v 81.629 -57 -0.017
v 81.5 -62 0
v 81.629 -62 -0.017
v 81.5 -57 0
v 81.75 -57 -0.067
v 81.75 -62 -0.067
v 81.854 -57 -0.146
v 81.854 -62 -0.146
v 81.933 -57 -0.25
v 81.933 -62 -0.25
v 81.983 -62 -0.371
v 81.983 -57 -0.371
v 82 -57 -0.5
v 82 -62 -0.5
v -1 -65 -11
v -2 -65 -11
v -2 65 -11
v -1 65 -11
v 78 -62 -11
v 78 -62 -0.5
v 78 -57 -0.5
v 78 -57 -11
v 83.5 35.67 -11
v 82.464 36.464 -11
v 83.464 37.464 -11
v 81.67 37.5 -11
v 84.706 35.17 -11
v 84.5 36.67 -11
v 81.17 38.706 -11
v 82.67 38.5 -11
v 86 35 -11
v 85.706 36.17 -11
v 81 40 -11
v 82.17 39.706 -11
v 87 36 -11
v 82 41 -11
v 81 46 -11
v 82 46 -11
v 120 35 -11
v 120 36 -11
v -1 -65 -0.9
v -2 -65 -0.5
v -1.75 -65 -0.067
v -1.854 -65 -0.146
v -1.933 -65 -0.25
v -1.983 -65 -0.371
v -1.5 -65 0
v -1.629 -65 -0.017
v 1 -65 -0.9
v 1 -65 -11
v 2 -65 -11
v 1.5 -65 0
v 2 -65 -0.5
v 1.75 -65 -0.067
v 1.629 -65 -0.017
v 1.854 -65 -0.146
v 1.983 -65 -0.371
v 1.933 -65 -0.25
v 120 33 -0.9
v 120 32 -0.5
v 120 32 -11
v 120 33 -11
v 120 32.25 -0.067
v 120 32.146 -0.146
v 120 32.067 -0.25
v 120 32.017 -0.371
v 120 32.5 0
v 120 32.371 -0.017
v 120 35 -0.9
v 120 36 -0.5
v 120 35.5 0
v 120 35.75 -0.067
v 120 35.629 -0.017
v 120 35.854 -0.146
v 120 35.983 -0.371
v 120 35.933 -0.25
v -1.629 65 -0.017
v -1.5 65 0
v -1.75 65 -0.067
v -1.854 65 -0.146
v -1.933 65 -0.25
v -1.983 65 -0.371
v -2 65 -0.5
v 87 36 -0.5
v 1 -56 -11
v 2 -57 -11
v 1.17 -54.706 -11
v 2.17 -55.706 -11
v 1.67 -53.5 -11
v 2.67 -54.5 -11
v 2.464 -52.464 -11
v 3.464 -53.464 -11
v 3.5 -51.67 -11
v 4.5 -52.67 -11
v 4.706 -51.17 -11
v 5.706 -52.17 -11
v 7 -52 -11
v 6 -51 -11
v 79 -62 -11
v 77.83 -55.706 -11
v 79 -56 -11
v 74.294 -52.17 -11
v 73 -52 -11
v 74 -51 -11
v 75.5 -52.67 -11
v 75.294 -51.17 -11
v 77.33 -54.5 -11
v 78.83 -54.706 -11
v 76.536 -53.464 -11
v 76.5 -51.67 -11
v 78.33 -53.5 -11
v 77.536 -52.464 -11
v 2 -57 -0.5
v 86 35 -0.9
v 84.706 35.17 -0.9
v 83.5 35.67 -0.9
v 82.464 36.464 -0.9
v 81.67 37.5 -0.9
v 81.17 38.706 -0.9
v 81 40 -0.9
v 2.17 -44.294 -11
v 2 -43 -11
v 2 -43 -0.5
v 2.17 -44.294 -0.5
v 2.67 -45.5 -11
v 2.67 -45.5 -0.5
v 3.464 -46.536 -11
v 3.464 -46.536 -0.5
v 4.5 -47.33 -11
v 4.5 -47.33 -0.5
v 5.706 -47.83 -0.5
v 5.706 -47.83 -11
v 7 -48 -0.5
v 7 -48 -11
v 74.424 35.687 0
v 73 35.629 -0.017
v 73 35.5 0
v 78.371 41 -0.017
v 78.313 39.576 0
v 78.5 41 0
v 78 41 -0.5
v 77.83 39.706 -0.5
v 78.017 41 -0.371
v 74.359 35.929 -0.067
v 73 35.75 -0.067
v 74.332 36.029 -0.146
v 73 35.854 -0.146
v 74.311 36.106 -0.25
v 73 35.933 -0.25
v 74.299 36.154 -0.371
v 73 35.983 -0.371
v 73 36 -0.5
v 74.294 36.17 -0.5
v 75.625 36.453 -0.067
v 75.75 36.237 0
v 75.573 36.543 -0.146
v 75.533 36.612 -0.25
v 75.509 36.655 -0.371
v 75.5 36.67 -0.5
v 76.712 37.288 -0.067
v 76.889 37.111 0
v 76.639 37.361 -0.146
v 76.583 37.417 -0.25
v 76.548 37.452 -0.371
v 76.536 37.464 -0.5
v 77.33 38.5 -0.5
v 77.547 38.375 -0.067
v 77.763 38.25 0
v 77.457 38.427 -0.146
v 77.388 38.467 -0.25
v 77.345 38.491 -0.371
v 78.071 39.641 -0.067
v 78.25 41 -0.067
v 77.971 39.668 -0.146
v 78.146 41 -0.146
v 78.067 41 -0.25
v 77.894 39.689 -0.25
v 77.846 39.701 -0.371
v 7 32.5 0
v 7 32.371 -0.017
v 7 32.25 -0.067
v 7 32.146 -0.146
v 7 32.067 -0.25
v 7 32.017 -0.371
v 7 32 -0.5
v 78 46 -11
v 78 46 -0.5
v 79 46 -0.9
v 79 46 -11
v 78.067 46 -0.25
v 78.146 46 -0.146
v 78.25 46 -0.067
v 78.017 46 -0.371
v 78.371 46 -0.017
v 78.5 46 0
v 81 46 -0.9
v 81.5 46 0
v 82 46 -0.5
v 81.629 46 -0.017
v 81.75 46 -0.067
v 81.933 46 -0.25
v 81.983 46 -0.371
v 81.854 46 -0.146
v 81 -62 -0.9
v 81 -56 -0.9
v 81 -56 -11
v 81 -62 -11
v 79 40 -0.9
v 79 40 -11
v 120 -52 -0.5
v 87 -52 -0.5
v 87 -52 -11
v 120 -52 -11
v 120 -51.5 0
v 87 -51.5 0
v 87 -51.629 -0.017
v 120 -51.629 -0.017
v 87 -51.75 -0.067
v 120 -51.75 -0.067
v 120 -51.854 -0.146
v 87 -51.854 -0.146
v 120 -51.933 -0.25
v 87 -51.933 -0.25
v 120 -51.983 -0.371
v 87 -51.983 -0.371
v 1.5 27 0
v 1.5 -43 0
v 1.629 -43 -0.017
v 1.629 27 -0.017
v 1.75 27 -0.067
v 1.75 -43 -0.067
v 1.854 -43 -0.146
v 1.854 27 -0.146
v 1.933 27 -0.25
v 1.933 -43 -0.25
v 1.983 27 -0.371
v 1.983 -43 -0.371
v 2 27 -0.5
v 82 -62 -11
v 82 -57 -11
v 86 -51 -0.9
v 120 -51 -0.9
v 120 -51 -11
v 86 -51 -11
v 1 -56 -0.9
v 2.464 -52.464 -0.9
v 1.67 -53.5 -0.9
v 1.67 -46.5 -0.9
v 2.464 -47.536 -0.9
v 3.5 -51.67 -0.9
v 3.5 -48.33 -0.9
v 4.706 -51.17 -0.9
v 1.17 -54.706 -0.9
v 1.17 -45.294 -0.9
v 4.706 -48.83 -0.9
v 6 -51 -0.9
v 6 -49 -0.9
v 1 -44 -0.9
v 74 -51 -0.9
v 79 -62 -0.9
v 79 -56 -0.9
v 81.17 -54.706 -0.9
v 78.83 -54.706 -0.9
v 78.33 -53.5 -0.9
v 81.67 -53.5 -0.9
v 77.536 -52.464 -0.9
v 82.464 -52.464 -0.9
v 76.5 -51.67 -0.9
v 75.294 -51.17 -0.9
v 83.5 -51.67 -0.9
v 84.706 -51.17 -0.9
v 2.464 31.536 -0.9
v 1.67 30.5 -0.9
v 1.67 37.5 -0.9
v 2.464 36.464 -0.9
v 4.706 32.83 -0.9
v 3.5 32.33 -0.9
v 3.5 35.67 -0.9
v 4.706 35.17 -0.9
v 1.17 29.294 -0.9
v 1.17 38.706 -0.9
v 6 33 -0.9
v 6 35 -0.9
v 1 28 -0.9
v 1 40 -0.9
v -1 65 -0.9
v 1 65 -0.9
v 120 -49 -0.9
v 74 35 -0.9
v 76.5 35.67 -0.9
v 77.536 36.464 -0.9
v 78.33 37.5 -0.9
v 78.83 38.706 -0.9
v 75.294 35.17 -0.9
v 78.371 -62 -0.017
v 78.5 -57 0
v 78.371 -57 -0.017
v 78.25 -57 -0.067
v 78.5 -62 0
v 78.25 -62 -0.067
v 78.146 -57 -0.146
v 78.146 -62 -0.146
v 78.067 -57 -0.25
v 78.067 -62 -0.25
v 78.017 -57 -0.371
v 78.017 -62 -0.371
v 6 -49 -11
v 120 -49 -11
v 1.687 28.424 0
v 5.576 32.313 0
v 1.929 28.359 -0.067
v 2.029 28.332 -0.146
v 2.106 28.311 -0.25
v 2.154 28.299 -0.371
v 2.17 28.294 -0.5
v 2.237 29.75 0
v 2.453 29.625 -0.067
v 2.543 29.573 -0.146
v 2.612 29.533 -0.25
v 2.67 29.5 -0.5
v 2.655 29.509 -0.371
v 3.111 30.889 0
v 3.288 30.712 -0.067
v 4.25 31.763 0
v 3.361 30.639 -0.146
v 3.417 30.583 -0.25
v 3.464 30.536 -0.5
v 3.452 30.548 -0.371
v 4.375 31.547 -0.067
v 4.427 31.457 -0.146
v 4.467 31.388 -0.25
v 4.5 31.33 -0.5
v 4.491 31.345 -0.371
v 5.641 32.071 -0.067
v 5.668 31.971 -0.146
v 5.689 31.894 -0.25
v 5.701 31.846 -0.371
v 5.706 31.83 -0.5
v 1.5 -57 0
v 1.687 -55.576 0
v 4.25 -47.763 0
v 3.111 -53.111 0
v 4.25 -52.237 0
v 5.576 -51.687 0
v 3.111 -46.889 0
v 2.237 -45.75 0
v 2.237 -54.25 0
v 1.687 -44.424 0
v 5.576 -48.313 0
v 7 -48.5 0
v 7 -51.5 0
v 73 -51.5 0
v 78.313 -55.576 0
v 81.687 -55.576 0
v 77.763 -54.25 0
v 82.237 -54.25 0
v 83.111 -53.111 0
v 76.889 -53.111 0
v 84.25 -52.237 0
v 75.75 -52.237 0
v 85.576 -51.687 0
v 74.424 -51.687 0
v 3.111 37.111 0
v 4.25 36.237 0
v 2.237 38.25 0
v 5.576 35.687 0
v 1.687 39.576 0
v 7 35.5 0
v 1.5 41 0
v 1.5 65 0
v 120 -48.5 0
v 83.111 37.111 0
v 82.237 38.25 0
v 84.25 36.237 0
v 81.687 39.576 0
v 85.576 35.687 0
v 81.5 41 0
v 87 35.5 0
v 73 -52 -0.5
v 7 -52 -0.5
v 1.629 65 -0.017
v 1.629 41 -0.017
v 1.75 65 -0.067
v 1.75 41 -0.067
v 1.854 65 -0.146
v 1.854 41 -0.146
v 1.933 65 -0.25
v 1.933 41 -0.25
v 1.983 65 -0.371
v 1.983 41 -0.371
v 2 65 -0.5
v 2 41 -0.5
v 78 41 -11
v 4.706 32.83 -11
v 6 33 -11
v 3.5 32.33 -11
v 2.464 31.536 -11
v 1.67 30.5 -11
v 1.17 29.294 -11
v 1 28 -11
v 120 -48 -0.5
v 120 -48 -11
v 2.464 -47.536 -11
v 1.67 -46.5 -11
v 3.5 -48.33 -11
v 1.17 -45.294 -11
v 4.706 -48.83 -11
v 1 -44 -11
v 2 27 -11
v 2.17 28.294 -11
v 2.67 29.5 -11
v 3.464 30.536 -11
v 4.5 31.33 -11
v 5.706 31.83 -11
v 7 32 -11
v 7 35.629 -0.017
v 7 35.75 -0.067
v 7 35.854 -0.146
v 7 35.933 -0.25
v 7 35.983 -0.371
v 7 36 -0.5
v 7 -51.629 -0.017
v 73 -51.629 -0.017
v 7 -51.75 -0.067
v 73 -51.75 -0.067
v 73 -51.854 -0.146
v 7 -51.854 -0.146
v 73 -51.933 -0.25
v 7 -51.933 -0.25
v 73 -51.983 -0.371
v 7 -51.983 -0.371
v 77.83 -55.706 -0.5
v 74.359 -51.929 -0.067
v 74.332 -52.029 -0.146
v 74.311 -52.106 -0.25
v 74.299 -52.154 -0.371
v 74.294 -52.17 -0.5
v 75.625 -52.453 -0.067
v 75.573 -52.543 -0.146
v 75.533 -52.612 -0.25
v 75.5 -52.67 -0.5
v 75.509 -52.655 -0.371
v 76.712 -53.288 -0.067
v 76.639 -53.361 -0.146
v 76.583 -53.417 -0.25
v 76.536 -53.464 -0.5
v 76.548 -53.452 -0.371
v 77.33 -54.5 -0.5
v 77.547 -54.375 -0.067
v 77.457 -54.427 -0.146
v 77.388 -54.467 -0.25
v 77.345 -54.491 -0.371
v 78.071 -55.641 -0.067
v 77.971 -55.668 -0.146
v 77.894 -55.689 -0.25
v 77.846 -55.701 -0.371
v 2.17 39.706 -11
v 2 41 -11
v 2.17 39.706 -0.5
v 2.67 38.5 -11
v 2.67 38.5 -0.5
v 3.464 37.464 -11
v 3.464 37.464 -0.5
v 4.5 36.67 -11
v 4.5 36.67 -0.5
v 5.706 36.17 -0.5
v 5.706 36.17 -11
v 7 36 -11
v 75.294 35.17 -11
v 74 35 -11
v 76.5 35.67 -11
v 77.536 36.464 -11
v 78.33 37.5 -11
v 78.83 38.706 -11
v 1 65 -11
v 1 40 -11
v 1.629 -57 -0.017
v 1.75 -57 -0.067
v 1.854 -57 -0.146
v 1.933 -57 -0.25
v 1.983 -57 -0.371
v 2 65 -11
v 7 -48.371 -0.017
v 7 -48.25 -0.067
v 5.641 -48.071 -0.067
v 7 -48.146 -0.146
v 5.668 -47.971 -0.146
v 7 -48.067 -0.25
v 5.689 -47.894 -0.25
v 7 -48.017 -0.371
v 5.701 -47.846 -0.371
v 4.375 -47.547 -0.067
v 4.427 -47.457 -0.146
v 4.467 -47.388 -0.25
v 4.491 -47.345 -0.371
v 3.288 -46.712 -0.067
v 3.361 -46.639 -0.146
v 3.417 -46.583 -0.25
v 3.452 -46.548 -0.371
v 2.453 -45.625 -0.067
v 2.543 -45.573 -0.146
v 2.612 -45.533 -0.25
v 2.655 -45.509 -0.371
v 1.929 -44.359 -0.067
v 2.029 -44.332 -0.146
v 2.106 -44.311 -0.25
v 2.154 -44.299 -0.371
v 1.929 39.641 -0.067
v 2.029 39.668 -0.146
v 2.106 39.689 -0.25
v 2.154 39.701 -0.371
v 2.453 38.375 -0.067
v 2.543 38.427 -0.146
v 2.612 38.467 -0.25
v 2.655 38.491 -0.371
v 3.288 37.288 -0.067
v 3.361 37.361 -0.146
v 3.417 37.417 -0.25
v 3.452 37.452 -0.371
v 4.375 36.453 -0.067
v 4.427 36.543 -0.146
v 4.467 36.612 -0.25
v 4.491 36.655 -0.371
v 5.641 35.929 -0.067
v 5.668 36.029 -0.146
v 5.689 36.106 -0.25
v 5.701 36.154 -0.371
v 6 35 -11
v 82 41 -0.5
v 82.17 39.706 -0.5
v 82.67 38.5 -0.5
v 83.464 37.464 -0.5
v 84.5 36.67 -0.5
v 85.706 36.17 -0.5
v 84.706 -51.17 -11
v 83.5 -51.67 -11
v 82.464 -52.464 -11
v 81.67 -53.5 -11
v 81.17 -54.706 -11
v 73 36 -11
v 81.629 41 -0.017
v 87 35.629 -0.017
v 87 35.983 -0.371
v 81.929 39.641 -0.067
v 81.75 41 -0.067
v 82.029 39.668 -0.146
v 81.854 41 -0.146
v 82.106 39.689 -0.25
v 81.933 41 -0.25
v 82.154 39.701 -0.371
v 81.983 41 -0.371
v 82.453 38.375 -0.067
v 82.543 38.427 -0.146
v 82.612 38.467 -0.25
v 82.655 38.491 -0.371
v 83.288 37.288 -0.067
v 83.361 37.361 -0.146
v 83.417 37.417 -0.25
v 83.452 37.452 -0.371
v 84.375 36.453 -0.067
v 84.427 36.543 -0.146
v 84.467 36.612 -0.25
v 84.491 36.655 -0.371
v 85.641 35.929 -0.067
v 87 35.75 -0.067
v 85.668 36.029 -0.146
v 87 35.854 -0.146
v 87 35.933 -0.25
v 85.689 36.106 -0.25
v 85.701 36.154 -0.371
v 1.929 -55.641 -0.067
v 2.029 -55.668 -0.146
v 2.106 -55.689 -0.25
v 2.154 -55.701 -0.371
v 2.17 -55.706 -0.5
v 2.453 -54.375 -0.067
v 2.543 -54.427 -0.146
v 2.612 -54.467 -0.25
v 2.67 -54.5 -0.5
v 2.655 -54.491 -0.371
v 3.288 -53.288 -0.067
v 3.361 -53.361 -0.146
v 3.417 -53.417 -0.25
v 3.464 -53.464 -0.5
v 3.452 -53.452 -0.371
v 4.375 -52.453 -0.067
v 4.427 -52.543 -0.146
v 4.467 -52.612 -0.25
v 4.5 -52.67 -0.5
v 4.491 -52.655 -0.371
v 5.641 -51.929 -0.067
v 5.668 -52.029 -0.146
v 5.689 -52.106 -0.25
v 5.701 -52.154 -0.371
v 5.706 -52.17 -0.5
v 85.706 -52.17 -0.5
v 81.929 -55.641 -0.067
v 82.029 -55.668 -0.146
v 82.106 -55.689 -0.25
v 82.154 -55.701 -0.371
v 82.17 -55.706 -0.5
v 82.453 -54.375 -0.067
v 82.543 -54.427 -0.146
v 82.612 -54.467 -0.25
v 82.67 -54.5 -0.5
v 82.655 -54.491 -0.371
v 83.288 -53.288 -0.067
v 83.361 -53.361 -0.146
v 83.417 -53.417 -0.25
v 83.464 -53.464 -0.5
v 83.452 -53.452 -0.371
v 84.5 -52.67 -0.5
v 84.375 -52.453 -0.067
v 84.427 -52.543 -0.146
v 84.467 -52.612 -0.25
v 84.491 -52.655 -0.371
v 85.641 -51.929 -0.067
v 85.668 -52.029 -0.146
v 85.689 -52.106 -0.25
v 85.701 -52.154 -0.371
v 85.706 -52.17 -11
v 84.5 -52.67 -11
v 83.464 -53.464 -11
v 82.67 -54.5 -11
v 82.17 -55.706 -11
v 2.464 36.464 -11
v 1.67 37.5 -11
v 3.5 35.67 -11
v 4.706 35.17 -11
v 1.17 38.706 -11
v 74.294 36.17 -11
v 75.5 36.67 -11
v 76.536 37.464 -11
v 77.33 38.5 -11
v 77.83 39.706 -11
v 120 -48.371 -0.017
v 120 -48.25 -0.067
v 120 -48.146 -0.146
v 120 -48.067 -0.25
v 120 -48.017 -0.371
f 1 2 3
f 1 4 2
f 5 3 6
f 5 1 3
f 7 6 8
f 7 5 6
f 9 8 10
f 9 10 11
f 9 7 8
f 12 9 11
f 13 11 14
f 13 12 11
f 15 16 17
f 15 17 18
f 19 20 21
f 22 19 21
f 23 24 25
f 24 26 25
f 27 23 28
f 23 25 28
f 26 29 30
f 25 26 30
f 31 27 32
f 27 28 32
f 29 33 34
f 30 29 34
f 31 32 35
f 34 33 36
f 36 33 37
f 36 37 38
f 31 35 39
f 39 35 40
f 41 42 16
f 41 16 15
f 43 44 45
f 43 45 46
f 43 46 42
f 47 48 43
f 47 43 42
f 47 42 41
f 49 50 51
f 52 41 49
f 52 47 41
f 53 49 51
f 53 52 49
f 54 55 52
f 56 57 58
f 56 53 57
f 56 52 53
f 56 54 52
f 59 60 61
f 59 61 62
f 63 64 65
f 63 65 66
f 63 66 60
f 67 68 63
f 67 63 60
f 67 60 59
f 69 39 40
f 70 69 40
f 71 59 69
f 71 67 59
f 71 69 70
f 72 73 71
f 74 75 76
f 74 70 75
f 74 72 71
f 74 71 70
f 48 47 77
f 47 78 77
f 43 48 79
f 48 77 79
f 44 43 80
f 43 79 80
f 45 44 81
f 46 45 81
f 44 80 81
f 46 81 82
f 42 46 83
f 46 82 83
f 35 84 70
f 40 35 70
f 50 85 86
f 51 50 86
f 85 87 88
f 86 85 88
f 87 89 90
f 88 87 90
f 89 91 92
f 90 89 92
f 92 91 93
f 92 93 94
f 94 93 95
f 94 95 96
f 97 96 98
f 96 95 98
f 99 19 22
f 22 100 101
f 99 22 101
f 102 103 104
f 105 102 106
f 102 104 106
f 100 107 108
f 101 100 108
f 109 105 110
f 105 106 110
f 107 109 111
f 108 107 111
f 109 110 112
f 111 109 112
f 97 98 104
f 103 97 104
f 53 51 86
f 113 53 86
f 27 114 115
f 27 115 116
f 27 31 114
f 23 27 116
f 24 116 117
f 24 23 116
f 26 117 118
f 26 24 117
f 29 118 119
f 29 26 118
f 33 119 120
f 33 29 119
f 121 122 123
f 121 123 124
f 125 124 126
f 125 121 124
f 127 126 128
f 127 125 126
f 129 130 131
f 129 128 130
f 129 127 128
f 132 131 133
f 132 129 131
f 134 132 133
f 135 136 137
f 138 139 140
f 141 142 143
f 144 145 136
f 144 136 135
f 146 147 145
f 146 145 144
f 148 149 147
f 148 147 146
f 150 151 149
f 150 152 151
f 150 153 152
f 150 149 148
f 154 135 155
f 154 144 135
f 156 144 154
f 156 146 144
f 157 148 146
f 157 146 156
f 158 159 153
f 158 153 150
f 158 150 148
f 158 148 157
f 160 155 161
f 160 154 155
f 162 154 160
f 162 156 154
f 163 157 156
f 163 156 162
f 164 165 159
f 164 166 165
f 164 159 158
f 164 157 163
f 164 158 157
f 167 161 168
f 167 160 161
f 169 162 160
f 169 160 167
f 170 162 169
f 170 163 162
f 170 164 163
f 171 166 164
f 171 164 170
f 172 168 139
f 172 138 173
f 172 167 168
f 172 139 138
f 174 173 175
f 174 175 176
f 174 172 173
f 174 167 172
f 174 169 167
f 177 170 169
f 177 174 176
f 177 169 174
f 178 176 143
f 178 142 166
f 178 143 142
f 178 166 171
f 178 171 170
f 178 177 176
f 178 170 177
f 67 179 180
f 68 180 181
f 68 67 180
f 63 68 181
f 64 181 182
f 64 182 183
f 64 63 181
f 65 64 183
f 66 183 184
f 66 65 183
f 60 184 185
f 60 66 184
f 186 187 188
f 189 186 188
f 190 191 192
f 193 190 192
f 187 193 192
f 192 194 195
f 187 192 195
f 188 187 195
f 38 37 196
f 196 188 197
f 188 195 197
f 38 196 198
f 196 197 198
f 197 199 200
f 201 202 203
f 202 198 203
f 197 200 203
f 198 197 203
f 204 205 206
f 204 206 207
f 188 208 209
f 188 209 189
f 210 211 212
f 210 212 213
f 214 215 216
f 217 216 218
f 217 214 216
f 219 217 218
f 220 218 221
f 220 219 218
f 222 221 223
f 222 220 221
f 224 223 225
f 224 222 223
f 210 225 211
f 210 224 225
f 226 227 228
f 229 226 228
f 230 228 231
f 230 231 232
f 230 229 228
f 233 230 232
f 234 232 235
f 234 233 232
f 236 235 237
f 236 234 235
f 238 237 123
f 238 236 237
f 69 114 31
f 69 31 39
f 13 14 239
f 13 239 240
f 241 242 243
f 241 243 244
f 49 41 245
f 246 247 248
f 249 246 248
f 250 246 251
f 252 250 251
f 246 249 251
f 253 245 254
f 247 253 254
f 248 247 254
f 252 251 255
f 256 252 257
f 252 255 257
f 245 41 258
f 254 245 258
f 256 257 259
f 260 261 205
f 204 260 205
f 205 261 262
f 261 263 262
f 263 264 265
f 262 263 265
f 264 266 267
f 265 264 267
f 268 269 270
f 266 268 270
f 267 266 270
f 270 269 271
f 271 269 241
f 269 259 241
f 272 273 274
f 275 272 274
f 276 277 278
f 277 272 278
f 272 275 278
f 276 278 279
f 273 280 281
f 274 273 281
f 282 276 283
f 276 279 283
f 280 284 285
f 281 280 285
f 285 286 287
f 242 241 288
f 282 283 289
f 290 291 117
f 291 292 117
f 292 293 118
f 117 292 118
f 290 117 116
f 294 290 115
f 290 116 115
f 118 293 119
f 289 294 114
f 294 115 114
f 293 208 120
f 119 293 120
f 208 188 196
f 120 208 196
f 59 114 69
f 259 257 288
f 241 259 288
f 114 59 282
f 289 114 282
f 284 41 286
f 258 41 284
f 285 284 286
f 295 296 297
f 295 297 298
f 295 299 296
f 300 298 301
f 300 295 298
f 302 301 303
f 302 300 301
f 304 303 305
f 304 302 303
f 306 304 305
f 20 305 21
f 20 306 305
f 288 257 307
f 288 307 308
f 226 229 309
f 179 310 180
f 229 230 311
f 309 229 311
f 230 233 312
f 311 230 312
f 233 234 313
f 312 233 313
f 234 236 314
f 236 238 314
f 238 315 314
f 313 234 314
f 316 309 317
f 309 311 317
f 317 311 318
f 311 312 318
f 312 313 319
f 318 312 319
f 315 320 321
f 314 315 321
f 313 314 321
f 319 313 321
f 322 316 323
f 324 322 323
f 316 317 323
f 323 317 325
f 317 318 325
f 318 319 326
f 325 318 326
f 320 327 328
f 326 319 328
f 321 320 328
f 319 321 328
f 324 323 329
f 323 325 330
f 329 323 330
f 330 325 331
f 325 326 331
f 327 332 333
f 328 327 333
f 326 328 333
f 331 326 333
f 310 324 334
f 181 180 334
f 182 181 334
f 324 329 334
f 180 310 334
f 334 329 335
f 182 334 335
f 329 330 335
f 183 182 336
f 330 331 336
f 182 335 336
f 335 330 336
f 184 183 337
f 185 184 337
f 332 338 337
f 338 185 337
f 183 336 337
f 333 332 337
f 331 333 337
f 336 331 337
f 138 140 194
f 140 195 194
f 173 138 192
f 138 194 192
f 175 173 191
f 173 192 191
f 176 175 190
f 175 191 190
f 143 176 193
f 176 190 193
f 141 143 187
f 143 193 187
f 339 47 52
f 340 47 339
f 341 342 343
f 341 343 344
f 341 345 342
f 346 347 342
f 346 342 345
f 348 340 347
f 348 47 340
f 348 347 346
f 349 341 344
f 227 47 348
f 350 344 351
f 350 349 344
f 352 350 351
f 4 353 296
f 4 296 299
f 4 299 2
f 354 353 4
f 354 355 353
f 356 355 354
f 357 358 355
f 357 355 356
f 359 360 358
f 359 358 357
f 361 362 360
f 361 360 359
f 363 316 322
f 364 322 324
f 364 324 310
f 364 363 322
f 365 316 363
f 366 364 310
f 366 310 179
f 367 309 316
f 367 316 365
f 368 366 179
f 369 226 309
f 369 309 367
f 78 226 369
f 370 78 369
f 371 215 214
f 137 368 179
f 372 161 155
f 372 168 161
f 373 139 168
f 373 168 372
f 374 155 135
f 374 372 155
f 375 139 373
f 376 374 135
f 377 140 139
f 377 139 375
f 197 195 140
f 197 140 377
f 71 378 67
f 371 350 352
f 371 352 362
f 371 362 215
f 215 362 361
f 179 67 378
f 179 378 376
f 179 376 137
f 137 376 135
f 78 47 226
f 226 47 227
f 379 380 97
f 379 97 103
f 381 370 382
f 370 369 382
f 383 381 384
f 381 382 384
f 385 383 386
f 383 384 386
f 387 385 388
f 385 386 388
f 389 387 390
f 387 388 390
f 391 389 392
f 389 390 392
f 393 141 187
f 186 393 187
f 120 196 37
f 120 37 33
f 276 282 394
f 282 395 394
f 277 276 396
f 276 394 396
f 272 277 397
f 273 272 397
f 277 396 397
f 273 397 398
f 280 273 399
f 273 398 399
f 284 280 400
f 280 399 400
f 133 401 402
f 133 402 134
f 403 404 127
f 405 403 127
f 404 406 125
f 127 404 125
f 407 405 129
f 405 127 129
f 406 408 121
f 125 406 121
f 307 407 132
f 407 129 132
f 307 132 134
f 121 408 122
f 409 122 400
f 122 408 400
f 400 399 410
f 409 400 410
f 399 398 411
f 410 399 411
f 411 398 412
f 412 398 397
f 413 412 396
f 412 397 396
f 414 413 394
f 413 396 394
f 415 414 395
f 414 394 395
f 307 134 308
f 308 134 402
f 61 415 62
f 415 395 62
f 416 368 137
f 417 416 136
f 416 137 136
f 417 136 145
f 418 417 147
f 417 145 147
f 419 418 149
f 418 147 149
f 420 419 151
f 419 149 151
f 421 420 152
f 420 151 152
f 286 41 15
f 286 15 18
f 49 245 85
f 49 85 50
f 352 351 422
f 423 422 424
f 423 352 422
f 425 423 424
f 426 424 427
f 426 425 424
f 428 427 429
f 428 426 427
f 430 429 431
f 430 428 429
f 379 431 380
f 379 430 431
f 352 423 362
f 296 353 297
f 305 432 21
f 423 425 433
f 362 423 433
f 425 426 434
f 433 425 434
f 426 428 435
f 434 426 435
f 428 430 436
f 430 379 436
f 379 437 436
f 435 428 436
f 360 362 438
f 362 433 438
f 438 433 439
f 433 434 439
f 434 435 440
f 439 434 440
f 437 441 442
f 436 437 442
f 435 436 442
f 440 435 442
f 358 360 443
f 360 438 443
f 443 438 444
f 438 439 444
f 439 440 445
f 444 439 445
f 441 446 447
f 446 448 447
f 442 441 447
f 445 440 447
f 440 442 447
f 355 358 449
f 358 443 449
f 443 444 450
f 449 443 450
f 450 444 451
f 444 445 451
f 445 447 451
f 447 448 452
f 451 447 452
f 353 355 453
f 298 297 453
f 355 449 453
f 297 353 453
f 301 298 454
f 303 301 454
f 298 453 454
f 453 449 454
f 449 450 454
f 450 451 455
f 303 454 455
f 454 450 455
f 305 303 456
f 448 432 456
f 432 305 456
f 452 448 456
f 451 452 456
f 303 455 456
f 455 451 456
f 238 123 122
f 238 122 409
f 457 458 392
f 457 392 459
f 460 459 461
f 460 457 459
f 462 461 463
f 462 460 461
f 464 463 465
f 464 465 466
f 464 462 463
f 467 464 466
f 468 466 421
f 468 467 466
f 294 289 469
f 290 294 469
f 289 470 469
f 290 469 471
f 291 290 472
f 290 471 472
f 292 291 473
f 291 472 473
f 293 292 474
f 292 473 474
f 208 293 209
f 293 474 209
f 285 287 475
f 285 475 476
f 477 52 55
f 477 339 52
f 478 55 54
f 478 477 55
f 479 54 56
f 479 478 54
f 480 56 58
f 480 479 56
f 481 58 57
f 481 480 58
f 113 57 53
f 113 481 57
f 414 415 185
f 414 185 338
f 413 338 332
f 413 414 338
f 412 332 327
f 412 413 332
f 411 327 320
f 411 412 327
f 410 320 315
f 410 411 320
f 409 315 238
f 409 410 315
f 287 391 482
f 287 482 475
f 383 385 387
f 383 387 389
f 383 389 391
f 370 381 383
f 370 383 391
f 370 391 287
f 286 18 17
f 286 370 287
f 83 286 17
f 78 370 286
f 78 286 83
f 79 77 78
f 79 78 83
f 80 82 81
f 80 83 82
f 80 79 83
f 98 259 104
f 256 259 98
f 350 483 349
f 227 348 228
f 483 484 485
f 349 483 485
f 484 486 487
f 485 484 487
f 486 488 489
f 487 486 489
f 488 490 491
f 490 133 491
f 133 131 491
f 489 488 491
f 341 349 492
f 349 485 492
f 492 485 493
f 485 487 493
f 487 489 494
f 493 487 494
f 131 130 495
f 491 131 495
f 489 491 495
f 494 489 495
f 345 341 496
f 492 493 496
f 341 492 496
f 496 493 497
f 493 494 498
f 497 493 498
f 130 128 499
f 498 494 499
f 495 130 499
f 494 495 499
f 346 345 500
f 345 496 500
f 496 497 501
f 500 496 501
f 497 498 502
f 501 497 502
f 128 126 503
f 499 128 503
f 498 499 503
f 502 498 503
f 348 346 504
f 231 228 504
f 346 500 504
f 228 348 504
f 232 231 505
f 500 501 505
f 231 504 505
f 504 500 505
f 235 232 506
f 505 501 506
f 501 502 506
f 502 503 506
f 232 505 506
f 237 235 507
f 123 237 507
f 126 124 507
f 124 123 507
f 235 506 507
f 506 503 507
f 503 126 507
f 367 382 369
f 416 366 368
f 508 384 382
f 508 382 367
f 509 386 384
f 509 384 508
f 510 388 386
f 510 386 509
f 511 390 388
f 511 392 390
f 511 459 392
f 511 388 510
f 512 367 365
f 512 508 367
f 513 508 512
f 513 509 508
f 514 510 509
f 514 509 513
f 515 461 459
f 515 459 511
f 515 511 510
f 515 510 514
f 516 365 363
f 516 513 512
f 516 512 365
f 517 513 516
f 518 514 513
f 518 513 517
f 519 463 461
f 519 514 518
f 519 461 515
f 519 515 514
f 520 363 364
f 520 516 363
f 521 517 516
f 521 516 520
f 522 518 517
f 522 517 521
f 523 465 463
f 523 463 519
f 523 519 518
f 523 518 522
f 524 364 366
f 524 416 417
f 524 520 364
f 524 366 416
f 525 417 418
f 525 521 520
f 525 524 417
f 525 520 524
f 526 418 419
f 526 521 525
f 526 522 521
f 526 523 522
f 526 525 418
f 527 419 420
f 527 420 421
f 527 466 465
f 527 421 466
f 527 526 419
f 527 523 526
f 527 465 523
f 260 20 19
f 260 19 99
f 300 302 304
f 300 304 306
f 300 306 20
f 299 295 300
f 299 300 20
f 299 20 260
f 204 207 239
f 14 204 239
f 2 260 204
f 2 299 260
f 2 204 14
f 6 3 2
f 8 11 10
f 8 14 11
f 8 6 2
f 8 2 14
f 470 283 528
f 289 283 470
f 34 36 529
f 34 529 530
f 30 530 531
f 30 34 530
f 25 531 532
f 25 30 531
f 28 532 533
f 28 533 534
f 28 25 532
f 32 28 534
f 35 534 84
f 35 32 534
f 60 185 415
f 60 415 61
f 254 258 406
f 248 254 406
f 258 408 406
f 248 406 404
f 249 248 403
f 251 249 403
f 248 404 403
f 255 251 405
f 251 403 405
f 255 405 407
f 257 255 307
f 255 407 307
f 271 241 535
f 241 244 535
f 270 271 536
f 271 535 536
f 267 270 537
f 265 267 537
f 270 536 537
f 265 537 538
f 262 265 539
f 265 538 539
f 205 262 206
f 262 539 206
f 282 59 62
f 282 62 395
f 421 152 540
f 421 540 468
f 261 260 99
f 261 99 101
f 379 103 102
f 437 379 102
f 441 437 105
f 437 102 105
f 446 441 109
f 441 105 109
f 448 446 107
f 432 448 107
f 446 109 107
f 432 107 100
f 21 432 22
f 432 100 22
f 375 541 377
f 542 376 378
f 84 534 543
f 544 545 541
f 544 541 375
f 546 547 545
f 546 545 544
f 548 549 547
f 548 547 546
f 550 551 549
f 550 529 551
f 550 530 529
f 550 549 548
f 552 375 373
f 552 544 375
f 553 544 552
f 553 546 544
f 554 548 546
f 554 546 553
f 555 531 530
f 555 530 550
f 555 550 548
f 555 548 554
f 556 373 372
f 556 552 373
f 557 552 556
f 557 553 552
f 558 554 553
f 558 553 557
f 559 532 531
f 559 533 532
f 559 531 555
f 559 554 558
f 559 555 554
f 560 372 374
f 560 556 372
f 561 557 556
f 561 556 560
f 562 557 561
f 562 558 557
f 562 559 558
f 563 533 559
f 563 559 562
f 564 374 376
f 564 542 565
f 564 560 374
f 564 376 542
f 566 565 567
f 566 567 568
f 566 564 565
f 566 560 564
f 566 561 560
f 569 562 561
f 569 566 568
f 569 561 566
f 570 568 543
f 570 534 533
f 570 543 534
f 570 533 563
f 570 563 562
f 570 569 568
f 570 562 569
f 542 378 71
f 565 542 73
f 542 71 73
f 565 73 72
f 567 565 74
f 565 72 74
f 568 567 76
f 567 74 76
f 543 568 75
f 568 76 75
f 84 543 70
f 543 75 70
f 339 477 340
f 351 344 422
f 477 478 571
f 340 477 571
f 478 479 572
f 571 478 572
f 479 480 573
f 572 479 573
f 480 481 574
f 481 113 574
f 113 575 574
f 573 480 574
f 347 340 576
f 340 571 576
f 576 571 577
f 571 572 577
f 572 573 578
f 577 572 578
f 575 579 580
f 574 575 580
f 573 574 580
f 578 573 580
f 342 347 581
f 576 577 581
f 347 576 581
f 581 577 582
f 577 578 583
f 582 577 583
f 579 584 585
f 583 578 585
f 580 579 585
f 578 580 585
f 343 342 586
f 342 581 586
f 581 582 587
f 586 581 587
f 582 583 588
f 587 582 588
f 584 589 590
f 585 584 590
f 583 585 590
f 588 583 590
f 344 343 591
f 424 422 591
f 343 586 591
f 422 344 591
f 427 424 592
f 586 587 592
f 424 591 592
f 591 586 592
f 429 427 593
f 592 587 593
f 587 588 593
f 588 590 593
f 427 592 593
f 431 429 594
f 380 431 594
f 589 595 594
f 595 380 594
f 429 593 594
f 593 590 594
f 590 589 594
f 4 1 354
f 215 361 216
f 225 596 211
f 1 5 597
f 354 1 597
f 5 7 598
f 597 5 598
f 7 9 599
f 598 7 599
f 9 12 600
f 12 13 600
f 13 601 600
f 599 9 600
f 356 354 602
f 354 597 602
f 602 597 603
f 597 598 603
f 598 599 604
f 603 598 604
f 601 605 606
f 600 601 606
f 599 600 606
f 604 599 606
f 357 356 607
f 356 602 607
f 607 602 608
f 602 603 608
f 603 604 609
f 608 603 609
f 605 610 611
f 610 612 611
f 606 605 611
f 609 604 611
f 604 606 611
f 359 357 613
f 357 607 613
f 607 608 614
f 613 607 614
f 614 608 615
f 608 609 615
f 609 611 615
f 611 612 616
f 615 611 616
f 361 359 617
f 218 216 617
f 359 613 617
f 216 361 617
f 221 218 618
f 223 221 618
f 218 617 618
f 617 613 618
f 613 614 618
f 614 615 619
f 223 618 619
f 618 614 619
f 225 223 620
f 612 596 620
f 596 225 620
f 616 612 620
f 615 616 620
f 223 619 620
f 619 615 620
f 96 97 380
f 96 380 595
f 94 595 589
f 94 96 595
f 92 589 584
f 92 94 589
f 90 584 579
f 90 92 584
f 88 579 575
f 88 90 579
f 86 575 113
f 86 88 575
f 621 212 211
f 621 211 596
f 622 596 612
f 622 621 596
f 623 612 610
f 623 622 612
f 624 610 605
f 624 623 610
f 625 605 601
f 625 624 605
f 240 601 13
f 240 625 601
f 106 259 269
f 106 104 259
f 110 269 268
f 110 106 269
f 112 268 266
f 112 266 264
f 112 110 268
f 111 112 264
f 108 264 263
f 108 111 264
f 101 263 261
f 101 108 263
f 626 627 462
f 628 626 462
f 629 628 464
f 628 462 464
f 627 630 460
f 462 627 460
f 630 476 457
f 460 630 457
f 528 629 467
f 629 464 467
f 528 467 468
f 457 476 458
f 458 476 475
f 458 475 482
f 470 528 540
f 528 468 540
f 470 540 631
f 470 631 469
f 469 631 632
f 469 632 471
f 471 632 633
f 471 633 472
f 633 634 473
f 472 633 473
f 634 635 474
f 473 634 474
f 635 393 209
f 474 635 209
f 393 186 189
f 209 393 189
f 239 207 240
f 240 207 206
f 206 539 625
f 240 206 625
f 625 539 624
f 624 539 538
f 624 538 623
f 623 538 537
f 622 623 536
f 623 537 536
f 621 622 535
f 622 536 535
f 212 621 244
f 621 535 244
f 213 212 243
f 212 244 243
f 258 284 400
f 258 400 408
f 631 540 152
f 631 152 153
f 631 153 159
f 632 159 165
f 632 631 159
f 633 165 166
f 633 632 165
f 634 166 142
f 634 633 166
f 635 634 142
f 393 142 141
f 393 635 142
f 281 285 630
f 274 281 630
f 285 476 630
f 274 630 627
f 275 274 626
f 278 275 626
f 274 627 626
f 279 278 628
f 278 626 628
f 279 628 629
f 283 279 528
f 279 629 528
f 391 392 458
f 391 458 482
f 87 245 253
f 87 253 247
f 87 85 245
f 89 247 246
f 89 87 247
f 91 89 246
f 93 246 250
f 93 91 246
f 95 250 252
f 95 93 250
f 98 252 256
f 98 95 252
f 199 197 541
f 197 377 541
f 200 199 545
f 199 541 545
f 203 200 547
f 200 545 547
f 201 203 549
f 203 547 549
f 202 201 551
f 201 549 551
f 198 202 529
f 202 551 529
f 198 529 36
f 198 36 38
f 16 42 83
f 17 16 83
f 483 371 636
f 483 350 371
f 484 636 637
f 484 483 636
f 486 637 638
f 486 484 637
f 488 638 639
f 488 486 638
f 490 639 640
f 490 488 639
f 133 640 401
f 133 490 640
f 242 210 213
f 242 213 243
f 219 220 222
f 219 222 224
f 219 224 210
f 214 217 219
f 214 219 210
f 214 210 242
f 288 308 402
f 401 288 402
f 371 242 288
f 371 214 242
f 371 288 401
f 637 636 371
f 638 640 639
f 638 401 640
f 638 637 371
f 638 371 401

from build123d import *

# Parameters (mm, degrees)
F0_W     = 2
F0_H     = 10
F0_H_2   = 1
F1_DEPTH = 0.9
F0_W_2   = 1
F0_H_3   = 130
F0_W_3   = 76
F0_W_4   = 38
F2_DEPTH = 11
F3_R     = 5
F4_R     = 0.5


with BuildPart() as f1:
    # F0 (on Top) → F1 (new body)
    with BuildSketch(Plane.XY):
        Polygon((-1, -65), (1, -65), (1, -51), (1, -49), (1, 33), (1, 35), (1, 65), (-1, 65), align=None)
        Polygon((1, 35), (1, 33), (2, 33), (79, 33), (81, 33), (120, 33), (120, 35), (82, 35), (81, 35), (79, 35), (78, 35), (2, 35), align=None)
        with Locations((80, 41)):
            Rectangle(F0_W, F0_H)
        with Locations((80, 35.5)):
            Rectangle(F0_W, F0_H_2)
        Polygon((1, -49), (1, -51), (2, -51), (78, -51), (79, -51), (81, -51), (82, -51), (120, -51), (120, -49), (81, -49), (79, -49), (2, -49), align=None)
        with Locations((80, -57)):
            Rectangle(F0_W, F0_H)
        with Locations((80, -51.5)):
            Rectangle(F0_W, F0_H_2)
    extrude(amount=-F1_DEPTH)

    # F0 (on Top) → F2 (join)
    with BuildSketch(Plane.XY):
        Polygon((1, -51), (1, -65), (2, -65), (2, -52), (2, -51), align=None)
        with Locations((-1.5, 0)):
            Rectangle(F0_W_2, F0_H_3)
        Polygon((1, 33), (1, -49), (2, -49), (2, -48), (2, 32), (2, 33), align=None)
        with Locations((40, -51.5)):
            Rectangle(F0_W_3, F0_H_2)
        Polygon((2, 65), (1, 65), (1, 35), (2, 35), (2, 36), align=None)
        Polygon((2, -48), (2, -49), (79, -49), (79, -48), (78, -48), align=None)
        with Locations((78.5, -51.5)):
            Rectangle(F0_W_2, F0_H_2)
        with Locations((78.5, -57)):
            Rectangle(F0_W_2, F0_H)
        Polygon((79, 33), (2, 33), (2, 32), (78, 32), (79, 32), align=None)
        with Locations((80, -48.5)):
            Rectangle(F0_W, F0_H_2)
        with Locations((40, 35.5)):
            Rectangle(F0_W_3, F0_H_2)
        with Locations((80, 32.5)):
            Rectangle(F0_W, F0_H_2)
        Polygon((81, -48), (81, -49), (120, -49), (120, -48), (82, -48), align=None)
        with Locations((81.5, -51.5)):
            Rectangle(F0_W_2, F0_H_2)
        with Locations((81.5, -57)):
            Rectangle(F0_W_2, F0_H)
        with Locations((78.5, 35.5)):
            Rectangle(F0_W_2, F0_H_2)
        with Locations((78.5, 41)):
            Rectangle(F0_W_2, F0_H)
        Polygon((120, 33), (81, 33), (81, 32), (82, 32), (120, 32), align=None)
        with Locations((101, -51.5)):
            Rectangle(F0_W_4, F0_H_2)
        with Locations((81.5, 35.5)):
            Rectangle(F0_W_2, F0_H_2)
        with Locations((81.5, 41)):
            Rectangle(F0_W_2, F0_H)
        with Locations((101, 35.5)):
            Rectangle(F0_W_4, F0_H_2)
    extrude(amount=-F2_DEPTH)

    # F3
    f3_edges = [f1.edges().sort_by_distance(p)[0] for p in [
        (78, -52, -5.5),
        (81, -51, -5.95),
        (82, -52, -5.5),
        (79, -51, -5.95),
        (1, -49, -5.95),
        (1, -51, -5.95),
        (2, -52, -5.5),
        (2, -48, -5.5),
        (2, 36, -5.5),
        (1, 33, -5.95),
        (1, 35, -5.95),
        (2, 32, -5.5),
        (81, 35, -5.95),
        (79, 35, -5.95),
        (82, 36, -5.5),
        (78, 36, -5.5),
    ]]
    fillet(f3_edges, radius=F3_R)

    # F4
    f4_edges = [f1.edges().sort_by_distance(p)[0] for p in [
        (63.5, 32, 0),
        (103.5, 36, 0),
        (82, 43.5, 0),
        (78, 43.5, 0),
        (40, 36, 0),
        (2, 53, 0),
        (40, -52, 0),
        (103.5, -52, 0),
        (-2, 0, 0),
        (2, -61, 0),
        (3.464466, -53.464466, 0),
        (76.535534, -53.464466, 0),
        (78, -59.5, 0),
        (3.464466, 37.464466, 0),
        (82, -59.5, 0),
        (83.464466, -53.464466, 0),
        (76.535534, 37.464466, 0),
        (63.5, -48, 0),
        (3.464466, -46.535534, 0),
        (83.464466, 37.464466, 0),
        (2, -8, 0),
        (3.464466, 30.535534, 0),
    ]]
    fillet(f4_edges, radius=F4_R)


solid = f1.part
